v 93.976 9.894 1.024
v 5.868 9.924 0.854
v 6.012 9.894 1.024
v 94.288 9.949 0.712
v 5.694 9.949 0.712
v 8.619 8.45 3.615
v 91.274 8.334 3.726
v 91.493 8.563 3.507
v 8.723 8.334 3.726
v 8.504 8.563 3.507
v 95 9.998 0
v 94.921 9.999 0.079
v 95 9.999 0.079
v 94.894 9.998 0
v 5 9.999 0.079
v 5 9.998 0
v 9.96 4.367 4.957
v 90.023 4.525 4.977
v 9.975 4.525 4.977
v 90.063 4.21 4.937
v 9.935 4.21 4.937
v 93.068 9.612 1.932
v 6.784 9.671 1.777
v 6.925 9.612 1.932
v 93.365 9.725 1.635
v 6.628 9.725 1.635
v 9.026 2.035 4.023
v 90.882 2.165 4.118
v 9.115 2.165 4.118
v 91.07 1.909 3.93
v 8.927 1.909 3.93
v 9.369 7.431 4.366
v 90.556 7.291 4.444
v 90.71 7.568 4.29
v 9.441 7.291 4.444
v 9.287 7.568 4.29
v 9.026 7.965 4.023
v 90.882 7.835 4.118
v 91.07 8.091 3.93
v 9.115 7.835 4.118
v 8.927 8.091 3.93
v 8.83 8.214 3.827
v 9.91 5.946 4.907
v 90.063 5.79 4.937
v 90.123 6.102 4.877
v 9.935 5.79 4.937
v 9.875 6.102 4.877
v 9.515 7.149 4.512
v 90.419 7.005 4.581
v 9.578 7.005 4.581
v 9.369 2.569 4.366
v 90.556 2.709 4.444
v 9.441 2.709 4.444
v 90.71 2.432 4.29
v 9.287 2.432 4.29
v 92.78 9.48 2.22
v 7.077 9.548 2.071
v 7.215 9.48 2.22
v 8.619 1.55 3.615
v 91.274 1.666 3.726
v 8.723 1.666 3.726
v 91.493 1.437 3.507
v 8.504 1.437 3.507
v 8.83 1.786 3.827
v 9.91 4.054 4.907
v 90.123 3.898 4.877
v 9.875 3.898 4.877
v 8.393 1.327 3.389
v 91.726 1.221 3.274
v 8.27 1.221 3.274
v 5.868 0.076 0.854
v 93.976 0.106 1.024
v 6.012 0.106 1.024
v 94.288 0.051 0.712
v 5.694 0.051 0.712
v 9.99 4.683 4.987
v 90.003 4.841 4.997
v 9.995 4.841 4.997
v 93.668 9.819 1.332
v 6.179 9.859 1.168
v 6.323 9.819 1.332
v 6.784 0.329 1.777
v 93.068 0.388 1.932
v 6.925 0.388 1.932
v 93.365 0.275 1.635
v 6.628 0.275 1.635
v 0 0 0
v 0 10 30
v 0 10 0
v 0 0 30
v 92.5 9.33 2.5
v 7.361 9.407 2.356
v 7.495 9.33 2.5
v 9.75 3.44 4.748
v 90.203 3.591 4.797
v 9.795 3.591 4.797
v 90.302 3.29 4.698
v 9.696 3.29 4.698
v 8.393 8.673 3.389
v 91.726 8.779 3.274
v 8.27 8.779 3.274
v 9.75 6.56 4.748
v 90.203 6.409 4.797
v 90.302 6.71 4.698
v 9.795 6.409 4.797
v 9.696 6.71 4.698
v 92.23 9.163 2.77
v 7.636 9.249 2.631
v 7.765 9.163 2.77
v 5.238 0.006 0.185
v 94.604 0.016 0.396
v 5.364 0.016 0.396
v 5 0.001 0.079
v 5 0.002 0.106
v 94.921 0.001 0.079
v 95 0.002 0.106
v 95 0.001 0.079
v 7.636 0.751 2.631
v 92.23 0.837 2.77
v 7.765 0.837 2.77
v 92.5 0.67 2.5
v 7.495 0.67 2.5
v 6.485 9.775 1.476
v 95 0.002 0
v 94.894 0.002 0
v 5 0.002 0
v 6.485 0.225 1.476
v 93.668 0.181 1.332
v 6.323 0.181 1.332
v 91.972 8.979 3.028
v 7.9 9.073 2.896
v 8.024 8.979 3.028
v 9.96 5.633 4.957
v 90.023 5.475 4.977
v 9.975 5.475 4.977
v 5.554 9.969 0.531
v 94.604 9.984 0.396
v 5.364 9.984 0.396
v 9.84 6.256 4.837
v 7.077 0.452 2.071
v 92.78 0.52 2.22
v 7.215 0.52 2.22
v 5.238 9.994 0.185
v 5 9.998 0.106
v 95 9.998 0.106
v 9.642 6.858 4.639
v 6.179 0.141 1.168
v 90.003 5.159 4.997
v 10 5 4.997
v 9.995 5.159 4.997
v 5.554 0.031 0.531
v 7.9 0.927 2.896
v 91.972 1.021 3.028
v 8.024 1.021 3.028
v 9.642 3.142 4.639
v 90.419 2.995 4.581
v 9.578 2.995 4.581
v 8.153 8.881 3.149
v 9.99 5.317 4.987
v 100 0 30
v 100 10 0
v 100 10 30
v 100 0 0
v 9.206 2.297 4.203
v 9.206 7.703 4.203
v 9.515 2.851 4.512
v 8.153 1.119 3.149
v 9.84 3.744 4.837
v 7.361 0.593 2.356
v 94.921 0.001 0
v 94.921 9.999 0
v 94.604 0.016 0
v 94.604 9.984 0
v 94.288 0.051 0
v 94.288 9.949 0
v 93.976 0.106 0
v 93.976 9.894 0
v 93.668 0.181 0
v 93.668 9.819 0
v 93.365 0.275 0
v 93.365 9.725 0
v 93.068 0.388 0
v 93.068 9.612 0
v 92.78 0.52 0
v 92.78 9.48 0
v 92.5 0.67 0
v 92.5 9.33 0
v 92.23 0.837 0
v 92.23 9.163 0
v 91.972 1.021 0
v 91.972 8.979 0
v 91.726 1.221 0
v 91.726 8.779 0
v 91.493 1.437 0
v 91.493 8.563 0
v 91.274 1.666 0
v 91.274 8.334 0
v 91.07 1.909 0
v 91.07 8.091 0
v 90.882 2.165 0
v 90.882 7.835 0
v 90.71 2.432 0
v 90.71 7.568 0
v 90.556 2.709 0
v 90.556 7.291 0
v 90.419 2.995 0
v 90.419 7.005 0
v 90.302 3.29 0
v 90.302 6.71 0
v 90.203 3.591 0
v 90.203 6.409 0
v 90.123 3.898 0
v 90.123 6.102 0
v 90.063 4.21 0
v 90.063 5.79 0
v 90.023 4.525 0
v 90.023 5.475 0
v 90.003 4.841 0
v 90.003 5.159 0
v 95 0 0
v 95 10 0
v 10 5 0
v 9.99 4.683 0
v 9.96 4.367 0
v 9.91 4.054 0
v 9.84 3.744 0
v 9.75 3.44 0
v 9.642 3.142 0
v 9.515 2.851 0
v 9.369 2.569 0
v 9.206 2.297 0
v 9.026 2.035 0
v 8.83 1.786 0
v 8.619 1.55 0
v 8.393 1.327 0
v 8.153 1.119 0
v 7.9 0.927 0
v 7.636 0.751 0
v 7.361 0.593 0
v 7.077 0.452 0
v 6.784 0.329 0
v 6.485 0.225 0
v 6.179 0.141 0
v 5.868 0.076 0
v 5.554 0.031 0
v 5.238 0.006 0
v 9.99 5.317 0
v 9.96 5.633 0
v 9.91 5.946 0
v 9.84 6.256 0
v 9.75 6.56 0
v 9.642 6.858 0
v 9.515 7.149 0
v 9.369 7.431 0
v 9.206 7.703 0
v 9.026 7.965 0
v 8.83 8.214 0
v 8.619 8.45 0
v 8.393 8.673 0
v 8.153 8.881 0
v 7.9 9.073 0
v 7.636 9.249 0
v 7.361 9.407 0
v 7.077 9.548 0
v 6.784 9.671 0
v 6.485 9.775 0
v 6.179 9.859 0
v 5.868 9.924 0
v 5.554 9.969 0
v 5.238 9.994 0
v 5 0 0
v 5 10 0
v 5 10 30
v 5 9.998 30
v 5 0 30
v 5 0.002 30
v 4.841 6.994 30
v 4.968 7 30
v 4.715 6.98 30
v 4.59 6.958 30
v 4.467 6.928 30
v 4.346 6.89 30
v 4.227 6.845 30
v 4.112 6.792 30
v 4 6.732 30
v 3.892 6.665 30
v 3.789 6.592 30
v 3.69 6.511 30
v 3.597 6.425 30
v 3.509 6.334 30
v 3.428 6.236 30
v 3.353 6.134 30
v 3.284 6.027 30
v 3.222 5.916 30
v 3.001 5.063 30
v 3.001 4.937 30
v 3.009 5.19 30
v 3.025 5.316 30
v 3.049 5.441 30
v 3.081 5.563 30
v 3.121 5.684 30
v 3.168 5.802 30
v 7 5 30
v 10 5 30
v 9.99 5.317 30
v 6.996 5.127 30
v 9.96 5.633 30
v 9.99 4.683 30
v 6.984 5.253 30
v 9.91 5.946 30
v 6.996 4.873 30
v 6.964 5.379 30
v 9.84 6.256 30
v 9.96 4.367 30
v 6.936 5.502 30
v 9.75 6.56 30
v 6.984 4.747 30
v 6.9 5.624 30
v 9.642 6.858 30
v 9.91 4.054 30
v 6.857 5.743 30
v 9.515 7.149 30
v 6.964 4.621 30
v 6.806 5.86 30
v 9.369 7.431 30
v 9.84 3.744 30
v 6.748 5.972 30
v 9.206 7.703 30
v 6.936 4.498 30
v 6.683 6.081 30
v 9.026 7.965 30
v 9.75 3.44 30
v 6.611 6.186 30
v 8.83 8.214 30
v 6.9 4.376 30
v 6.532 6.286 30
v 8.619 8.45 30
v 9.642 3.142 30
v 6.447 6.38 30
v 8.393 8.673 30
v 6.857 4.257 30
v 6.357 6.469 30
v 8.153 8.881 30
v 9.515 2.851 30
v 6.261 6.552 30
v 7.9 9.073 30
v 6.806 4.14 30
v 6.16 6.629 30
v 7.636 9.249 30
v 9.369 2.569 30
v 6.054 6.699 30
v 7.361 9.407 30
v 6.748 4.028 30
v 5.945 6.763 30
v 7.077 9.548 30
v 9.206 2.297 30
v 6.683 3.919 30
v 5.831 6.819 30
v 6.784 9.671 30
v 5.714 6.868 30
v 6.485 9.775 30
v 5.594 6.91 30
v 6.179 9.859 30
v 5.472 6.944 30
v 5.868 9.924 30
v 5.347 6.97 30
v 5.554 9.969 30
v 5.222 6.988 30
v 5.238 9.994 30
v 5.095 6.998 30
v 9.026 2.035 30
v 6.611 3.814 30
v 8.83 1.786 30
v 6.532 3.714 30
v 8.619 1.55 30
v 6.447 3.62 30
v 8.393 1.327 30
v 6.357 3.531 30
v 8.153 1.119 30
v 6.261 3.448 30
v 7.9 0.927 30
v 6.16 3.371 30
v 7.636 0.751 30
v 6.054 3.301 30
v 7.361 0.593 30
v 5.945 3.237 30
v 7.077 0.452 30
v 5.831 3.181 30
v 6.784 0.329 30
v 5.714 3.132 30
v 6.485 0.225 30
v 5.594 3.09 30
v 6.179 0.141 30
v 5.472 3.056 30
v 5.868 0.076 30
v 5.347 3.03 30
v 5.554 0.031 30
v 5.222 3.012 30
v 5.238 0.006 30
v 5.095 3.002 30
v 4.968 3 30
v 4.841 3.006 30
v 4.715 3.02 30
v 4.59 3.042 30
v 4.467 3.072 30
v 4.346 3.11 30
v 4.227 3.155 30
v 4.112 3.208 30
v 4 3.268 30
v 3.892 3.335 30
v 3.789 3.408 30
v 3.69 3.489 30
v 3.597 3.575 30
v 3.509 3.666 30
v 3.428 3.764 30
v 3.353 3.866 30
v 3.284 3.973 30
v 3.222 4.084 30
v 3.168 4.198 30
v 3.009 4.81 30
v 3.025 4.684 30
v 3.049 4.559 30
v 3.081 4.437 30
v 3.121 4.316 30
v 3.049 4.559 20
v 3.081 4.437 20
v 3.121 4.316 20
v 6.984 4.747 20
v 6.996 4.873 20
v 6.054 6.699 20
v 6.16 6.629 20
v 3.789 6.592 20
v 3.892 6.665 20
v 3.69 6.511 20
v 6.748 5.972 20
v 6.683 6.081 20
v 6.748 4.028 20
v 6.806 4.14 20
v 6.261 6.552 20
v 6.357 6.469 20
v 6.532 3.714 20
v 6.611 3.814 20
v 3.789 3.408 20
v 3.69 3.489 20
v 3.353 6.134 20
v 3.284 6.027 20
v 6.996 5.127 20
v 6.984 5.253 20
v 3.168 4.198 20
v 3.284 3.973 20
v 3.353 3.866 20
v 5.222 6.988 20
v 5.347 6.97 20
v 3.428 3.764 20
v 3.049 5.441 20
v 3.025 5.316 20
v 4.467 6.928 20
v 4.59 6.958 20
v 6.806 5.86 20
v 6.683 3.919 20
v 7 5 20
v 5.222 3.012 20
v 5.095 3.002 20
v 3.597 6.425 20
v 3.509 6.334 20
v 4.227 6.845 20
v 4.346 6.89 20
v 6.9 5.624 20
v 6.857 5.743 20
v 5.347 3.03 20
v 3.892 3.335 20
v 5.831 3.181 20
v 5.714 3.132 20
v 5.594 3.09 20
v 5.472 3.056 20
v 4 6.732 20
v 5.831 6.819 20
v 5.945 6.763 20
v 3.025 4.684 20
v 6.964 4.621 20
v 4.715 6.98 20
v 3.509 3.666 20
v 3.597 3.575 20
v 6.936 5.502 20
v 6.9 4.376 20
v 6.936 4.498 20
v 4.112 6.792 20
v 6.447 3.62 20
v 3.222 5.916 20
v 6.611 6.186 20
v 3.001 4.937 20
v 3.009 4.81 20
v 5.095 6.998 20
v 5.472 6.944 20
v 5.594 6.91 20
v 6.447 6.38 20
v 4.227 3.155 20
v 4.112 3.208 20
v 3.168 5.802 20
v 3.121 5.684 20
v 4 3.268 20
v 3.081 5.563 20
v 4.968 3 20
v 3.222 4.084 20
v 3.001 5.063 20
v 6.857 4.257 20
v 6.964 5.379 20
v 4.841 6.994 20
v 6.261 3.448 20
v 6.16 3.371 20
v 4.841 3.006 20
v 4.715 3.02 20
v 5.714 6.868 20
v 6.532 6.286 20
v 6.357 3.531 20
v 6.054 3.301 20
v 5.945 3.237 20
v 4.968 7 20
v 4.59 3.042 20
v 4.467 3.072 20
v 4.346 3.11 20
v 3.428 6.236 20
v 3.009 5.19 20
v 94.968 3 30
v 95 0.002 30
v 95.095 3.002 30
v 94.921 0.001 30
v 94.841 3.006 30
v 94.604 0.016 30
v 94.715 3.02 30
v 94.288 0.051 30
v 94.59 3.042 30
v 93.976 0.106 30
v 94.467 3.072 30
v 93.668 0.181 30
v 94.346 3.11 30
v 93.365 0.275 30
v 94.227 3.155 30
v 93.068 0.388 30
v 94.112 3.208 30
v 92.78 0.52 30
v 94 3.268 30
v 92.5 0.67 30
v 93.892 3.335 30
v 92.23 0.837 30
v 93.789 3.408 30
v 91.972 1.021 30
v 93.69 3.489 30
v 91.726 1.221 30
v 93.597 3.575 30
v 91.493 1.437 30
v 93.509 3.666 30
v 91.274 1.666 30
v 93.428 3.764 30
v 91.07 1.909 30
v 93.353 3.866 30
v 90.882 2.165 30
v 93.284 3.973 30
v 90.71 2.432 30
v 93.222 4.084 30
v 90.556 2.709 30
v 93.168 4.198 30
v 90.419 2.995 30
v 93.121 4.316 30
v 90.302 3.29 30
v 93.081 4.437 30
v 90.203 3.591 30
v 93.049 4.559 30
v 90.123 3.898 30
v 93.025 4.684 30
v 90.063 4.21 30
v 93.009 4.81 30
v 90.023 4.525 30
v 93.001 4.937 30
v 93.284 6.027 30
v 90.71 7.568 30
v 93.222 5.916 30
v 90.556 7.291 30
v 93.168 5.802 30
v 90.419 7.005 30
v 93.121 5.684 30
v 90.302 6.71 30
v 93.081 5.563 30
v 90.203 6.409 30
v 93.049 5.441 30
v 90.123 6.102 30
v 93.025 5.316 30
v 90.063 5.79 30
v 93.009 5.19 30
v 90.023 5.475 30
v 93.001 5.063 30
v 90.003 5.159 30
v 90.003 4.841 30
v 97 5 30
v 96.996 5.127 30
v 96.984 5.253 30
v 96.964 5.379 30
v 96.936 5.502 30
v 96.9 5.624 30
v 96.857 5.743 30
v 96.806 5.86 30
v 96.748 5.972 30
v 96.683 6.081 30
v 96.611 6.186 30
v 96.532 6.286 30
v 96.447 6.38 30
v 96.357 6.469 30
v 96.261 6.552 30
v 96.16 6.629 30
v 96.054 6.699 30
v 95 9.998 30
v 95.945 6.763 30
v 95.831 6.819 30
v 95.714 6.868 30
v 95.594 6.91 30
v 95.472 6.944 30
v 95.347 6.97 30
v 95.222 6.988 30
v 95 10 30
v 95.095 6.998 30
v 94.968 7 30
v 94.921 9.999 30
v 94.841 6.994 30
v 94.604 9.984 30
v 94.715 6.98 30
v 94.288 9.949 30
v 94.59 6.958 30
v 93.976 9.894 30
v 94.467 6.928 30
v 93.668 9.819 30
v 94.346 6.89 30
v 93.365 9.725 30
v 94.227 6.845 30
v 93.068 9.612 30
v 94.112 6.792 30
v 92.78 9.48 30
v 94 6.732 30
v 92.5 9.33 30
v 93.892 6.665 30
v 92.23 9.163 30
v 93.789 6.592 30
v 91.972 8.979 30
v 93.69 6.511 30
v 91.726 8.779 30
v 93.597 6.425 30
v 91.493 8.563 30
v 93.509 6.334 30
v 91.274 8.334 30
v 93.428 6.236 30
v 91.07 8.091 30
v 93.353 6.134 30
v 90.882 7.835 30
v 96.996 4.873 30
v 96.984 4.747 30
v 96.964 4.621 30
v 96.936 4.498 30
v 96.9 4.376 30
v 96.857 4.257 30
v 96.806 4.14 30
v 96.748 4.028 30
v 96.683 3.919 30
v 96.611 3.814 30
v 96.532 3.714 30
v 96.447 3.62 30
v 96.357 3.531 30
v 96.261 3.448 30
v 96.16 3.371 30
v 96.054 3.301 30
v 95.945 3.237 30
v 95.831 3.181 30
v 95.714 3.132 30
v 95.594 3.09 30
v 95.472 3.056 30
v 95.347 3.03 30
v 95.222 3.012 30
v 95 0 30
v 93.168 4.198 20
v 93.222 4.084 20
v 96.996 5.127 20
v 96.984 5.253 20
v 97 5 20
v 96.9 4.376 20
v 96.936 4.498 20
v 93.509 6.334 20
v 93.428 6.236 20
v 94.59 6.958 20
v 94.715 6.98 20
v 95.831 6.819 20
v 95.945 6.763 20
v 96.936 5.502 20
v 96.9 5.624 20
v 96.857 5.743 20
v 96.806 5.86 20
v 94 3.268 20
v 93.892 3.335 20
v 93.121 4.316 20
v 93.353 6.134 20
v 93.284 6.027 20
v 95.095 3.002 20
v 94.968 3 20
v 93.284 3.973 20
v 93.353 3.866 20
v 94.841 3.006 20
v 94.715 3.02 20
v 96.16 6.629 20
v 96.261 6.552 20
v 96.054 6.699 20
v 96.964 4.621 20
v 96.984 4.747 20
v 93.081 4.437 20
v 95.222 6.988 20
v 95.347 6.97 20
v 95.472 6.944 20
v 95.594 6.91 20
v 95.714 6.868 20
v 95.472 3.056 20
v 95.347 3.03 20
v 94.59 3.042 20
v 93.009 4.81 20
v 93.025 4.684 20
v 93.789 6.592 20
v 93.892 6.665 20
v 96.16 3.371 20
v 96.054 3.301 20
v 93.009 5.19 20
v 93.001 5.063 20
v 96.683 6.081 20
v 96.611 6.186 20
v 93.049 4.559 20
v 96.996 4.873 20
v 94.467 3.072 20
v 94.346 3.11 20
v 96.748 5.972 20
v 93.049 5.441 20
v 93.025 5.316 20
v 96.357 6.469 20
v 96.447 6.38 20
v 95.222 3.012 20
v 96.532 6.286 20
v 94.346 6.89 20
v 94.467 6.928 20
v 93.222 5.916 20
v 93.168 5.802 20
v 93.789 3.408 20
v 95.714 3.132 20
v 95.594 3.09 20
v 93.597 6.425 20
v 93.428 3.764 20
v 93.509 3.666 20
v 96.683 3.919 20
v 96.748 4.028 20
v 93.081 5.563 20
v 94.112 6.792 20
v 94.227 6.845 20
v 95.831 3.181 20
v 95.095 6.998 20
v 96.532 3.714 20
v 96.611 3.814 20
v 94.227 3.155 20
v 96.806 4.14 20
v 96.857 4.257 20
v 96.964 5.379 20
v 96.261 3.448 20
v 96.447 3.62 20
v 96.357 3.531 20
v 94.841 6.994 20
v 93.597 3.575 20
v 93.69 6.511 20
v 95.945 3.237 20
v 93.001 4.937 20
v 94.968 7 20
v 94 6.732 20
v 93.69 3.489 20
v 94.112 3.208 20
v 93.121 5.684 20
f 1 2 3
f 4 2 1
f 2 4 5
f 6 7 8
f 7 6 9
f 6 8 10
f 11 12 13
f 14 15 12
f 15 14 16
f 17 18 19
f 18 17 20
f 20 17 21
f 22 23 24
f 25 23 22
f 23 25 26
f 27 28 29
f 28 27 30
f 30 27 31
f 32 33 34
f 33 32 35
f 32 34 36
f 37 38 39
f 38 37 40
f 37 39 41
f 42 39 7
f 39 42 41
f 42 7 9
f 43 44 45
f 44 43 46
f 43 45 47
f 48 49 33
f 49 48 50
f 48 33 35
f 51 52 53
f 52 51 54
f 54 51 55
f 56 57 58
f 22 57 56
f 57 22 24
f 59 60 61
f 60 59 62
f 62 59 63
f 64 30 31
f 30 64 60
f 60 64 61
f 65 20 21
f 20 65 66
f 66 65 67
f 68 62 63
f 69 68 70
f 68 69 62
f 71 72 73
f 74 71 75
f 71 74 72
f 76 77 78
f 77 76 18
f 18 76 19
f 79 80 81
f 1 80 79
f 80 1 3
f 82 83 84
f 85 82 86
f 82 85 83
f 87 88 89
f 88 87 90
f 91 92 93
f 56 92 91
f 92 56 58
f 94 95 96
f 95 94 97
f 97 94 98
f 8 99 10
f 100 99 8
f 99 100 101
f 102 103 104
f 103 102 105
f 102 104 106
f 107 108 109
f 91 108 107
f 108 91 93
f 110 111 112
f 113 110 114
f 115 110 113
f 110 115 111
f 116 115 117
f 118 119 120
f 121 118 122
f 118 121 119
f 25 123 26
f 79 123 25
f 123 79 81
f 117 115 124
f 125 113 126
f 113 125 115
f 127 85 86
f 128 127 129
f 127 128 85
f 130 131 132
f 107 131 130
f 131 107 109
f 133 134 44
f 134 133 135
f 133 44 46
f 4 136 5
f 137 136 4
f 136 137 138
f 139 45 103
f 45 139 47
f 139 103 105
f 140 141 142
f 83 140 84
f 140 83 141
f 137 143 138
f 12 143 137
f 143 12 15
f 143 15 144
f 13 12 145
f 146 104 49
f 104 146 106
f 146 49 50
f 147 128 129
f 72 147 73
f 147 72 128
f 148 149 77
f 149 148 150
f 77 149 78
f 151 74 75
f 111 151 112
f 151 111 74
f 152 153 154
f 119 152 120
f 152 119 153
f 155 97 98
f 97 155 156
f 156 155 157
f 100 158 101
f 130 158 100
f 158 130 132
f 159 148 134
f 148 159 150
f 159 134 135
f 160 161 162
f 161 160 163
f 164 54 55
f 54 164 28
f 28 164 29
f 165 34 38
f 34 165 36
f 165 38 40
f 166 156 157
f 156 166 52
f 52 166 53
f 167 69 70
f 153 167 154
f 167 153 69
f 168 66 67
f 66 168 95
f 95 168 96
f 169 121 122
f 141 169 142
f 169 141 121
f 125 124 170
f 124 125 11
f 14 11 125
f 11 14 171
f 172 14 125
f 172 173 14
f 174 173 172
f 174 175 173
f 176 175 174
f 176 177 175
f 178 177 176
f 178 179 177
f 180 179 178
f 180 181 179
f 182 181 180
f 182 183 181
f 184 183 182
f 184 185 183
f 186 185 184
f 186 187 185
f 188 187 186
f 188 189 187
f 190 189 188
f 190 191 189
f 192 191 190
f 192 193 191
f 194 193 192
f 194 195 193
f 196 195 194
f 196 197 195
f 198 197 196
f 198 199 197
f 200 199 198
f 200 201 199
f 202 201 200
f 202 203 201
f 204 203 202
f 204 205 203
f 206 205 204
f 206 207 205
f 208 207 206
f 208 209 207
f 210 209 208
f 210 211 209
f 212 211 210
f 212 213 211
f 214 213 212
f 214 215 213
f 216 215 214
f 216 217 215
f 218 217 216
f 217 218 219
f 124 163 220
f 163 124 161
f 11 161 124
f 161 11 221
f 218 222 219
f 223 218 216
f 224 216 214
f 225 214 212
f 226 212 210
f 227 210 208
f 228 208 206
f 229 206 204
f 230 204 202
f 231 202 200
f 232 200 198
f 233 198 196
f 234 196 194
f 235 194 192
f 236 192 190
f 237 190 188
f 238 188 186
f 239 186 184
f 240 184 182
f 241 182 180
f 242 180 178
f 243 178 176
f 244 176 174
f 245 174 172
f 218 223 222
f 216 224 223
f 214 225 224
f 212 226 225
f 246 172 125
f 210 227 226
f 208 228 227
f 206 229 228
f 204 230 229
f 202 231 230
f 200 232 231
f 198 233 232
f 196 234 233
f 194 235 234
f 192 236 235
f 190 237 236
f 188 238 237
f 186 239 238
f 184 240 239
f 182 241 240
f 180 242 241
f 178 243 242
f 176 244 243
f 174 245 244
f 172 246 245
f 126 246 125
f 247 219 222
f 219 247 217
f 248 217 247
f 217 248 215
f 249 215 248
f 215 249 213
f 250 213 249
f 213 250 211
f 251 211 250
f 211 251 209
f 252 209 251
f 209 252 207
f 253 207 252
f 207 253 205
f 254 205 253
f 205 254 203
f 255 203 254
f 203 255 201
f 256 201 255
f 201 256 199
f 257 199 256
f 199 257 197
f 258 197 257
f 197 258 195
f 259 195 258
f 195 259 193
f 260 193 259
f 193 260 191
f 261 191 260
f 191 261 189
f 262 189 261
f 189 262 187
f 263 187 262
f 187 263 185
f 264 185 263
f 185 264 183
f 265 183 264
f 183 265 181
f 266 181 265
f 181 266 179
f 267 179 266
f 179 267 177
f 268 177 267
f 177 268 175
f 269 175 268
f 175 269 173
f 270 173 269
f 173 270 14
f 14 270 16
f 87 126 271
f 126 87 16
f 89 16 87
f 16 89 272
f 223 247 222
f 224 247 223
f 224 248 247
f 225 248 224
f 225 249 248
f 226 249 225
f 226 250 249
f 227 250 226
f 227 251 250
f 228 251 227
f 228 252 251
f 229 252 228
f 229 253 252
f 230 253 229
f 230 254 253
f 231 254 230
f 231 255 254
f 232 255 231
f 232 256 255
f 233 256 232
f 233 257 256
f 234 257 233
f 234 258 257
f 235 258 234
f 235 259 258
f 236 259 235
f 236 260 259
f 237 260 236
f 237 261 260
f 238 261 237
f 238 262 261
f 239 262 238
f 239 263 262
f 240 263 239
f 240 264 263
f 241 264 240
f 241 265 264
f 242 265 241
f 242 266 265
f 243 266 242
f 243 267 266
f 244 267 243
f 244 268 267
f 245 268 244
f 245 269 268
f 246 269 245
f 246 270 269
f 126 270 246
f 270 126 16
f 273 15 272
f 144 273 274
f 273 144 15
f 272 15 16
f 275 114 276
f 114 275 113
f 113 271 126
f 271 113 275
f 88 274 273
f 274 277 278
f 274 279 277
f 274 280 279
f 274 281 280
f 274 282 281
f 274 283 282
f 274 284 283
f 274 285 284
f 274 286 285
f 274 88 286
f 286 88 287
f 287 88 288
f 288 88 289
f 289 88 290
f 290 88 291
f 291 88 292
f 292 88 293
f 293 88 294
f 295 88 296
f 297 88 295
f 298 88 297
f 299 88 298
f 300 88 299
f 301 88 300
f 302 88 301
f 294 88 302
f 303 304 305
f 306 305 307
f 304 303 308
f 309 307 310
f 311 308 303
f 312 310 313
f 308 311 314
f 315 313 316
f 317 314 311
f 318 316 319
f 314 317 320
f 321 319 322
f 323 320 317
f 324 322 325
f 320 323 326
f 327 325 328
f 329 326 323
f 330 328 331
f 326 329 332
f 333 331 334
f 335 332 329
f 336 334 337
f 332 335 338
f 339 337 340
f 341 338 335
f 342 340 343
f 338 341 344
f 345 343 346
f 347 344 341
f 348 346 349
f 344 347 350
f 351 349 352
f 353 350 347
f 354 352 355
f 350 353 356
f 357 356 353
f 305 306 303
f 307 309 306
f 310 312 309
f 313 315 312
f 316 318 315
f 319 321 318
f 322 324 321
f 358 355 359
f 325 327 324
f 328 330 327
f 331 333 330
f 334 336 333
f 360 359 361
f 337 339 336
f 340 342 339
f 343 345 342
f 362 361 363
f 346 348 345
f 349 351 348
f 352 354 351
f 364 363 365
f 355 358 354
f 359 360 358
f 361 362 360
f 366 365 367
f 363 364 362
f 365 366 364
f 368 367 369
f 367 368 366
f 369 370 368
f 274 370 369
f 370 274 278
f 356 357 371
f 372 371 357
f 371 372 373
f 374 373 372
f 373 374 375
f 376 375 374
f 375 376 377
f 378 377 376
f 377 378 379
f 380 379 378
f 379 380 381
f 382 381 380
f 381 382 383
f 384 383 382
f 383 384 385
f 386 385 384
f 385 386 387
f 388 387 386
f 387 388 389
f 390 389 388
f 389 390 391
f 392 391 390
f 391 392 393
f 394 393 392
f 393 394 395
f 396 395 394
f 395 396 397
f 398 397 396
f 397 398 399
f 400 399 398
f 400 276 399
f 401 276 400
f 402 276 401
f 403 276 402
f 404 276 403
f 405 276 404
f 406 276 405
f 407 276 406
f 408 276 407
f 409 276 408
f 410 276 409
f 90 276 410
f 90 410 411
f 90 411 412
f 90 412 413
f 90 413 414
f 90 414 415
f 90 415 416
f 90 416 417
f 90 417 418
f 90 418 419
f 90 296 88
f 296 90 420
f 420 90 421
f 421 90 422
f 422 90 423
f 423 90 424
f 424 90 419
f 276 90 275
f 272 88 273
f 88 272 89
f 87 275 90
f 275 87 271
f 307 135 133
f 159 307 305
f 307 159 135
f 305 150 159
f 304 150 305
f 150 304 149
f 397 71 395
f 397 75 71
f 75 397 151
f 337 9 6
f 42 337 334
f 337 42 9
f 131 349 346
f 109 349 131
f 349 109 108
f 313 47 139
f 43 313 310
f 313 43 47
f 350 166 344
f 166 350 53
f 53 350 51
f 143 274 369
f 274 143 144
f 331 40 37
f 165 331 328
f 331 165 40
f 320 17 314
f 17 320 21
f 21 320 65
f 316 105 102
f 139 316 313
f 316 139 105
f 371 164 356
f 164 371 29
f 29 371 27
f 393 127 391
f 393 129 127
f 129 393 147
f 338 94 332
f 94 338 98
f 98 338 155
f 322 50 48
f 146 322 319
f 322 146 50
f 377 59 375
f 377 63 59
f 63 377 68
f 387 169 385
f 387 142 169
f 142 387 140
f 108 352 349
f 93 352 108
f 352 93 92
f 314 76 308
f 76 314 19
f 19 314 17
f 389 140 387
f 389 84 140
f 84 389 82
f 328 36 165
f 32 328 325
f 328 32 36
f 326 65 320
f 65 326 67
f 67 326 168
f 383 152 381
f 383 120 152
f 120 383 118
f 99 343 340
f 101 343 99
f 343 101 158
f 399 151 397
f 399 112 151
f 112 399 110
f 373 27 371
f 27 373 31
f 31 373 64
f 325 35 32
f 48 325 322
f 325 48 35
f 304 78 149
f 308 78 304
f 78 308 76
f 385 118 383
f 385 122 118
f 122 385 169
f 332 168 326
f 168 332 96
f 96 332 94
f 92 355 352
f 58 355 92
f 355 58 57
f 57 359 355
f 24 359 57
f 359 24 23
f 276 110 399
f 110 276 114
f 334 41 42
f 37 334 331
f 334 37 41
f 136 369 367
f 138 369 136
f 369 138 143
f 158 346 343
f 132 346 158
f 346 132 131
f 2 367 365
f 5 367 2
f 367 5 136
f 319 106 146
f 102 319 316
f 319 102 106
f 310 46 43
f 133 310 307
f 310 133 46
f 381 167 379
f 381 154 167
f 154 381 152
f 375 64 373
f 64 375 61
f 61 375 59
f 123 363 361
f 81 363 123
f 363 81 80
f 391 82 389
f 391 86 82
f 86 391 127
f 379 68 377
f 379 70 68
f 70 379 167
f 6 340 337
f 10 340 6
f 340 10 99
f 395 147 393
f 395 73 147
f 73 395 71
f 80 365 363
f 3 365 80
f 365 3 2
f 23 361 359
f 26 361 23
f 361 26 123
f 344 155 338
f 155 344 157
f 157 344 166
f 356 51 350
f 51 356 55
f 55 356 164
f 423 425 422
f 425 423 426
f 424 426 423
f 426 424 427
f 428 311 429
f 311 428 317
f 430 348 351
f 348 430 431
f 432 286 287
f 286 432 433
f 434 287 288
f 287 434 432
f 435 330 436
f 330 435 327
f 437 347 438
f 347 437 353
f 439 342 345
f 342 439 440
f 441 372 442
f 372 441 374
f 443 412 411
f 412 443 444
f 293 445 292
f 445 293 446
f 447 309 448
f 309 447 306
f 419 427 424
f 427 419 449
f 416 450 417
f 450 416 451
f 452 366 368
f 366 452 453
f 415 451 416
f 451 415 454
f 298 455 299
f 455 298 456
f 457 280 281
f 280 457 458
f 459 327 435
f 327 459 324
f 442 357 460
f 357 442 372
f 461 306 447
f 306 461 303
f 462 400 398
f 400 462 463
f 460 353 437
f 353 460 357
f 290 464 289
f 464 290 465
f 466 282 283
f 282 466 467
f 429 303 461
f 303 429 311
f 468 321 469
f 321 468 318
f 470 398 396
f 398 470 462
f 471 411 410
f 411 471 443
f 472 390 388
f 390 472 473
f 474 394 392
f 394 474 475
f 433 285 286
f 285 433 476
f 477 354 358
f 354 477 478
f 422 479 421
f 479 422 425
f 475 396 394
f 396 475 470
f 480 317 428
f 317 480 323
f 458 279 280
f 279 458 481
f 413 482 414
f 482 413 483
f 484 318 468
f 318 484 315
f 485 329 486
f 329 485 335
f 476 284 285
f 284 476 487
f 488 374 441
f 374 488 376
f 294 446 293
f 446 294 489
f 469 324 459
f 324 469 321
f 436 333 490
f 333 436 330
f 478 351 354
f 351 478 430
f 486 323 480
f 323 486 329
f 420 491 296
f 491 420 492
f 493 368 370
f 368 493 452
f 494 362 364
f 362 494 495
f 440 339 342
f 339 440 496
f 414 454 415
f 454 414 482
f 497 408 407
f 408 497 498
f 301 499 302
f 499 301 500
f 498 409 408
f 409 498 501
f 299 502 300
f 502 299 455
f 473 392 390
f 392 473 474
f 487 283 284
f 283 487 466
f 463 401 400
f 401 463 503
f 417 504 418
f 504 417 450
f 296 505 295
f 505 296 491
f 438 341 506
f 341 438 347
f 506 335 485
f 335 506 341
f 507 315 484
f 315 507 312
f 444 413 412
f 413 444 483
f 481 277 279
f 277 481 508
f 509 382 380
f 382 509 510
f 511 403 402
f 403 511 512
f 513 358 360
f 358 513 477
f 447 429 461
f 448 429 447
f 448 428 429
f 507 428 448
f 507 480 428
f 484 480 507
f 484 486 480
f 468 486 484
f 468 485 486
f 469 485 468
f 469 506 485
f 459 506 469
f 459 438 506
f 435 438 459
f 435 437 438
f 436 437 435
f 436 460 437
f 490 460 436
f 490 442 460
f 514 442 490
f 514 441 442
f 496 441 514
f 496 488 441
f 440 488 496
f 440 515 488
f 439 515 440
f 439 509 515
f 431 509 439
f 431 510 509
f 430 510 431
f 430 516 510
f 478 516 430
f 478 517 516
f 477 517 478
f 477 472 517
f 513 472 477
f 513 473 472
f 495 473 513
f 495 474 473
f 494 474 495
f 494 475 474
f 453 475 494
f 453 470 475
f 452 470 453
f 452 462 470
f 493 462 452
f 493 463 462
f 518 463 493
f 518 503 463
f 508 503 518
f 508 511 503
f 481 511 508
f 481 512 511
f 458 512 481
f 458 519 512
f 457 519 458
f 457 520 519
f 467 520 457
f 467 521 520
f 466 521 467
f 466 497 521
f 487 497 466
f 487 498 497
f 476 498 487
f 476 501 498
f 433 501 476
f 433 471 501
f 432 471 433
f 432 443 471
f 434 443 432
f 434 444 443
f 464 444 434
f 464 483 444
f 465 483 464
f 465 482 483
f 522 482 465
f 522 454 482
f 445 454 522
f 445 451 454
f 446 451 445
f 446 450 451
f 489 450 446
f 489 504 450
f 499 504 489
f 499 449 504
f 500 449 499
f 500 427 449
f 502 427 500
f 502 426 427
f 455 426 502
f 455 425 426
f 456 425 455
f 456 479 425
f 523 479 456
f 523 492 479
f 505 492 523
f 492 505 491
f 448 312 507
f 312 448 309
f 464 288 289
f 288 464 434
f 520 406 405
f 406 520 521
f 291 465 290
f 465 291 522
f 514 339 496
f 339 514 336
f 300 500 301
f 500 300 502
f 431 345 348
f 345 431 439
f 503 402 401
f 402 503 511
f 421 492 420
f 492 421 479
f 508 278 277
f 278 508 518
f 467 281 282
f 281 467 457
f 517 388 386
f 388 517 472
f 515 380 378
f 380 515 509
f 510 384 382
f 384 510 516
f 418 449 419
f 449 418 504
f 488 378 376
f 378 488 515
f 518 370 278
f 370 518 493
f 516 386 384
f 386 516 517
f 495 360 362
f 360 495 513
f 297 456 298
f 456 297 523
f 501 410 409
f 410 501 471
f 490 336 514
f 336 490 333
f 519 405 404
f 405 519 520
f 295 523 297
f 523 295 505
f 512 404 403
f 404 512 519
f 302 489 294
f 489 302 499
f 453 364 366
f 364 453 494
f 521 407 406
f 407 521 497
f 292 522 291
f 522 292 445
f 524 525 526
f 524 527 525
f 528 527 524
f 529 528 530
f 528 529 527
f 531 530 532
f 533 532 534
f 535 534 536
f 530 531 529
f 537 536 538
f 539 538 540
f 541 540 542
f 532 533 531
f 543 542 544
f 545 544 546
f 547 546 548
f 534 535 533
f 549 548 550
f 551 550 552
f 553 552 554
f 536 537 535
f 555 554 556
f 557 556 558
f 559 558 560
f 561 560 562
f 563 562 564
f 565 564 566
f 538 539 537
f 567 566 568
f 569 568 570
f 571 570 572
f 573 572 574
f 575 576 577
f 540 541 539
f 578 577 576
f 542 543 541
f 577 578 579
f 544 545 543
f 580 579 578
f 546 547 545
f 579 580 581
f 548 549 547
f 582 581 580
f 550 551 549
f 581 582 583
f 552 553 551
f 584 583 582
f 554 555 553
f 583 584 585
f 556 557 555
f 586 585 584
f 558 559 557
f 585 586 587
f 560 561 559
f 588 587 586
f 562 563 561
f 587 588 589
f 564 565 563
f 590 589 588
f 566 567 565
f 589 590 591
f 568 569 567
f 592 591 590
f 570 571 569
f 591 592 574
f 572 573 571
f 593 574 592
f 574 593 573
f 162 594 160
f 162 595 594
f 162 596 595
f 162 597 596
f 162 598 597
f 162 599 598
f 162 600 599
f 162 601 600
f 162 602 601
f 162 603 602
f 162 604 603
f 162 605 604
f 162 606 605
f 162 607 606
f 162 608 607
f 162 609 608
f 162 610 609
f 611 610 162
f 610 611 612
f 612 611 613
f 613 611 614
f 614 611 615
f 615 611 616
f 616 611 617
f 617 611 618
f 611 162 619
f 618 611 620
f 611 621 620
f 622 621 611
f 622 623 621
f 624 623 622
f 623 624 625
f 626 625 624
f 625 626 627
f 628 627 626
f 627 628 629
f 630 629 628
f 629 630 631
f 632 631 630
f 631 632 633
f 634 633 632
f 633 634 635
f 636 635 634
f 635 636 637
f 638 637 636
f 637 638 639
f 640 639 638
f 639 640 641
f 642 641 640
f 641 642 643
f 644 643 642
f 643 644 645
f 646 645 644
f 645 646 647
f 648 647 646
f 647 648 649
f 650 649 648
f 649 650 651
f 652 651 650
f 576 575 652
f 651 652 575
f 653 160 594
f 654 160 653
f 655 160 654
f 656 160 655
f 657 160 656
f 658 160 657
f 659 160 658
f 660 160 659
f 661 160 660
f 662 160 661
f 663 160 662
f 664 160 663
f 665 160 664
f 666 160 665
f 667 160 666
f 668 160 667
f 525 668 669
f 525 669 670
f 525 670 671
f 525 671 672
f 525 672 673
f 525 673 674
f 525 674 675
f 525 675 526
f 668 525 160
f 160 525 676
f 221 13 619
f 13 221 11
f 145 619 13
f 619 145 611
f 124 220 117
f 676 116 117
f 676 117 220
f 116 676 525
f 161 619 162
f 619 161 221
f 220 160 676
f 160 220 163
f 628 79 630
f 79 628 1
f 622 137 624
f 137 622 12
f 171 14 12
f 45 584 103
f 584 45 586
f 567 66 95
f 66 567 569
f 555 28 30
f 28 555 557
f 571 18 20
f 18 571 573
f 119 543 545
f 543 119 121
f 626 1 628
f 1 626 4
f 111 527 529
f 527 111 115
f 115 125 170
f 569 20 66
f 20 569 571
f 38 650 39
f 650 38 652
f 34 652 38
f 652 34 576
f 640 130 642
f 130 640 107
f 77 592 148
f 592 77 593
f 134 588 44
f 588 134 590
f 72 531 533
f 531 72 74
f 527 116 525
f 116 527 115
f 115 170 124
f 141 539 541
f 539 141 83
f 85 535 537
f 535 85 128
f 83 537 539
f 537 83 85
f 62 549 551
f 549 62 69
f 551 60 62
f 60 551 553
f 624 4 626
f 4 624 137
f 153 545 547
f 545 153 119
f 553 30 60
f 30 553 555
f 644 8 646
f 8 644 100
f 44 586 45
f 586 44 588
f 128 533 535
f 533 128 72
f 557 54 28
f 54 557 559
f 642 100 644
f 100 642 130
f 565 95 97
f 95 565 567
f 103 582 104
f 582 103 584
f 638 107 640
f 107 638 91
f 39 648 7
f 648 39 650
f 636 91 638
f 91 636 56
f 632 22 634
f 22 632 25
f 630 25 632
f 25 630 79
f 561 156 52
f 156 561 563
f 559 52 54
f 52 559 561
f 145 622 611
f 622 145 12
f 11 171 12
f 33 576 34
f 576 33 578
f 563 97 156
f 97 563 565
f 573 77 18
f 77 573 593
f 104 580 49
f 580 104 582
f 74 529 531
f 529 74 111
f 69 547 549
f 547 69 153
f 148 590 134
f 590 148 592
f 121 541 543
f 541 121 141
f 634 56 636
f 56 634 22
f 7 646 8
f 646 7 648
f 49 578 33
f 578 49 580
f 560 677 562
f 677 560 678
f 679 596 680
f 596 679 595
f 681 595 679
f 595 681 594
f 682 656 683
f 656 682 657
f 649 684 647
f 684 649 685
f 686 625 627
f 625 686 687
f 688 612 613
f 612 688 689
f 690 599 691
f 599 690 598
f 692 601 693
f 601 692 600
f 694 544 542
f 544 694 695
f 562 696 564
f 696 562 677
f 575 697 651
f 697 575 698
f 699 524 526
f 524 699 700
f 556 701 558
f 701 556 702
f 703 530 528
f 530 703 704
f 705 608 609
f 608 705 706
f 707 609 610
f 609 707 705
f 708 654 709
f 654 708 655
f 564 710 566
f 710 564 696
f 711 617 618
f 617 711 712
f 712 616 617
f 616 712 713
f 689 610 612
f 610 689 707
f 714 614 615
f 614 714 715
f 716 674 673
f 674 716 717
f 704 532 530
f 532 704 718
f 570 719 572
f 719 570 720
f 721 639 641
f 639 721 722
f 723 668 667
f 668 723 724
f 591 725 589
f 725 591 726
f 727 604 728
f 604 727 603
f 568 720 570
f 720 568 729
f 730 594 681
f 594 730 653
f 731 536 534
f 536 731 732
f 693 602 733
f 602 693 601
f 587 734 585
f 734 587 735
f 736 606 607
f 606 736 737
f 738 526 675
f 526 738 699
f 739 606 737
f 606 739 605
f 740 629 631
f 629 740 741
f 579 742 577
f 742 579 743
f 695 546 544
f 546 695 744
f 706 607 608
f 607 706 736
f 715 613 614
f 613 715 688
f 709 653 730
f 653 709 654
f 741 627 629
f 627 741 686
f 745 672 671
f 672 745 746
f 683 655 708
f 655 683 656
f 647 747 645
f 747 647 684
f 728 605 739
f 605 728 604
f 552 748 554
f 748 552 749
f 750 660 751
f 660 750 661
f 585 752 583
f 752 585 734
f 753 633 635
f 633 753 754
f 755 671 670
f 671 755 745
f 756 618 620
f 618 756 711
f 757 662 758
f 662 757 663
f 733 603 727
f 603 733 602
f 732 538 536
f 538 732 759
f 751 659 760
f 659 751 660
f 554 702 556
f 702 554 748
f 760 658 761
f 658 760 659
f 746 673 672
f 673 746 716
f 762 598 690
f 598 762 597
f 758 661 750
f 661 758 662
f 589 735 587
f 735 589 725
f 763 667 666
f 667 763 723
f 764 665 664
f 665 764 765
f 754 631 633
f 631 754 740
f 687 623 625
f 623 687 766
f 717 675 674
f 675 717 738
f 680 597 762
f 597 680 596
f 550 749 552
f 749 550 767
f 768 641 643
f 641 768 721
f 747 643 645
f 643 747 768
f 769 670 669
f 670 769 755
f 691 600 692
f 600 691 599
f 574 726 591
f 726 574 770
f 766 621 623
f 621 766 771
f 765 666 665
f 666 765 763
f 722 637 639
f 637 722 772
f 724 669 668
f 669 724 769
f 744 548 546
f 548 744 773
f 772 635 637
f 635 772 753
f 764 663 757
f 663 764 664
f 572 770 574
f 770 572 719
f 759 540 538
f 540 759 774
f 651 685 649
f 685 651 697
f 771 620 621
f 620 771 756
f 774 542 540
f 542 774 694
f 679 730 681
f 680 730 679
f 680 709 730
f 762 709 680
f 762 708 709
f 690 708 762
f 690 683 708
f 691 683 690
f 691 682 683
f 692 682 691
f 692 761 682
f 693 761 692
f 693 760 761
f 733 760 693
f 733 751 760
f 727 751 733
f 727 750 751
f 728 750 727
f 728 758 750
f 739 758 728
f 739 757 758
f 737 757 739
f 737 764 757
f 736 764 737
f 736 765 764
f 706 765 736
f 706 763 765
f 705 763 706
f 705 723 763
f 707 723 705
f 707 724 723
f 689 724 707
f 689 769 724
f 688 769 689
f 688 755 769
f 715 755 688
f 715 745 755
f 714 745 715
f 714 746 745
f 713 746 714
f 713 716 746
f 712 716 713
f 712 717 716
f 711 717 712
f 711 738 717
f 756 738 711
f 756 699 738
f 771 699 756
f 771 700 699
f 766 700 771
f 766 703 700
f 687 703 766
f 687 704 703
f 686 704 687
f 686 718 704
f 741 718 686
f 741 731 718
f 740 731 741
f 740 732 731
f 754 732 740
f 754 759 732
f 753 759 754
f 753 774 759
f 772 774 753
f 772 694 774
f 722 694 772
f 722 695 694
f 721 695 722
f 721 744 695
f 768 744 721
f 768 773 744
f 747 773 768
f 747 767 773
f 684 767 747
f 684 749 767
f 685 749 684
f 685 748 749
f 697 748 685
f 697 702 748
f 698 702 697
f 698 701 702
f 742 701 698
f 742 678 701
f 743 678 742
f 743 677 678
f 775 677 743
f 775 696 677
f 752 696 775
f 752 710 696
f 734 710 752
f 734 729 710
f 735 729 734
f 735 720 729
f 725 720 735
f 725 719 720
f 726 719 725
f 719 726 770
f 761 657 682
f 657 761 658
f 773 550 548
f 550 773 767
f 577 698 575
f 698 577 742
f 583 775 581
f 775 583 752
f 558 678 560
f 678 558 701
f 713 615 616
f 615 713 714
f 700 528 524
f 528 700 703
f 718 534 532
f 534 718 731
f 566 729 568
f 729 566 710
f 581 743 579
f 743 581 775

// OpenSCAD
$fn = 99;

SUPPORT_HEIGHT=30;
HANDLE_LENGTH=100;

module handle(){
    difference(){
        translate([0,5,0]){
            rotate(a=90, v=[0,1,0]){
                cylinder(h=HANDLE_LENGTH, r=5);  
            }
        }

        translate([0,0,-5]){
            cube([HANDLE_LENGTH,10,5]);
        }
    }
}

module support(flipped){
    difference(){
        if (flipped){
            cube([5,10,SUPPORT_HEIGHT]);

            translate([5,5,0]){
                cylinder(h=SUPPORT_HEIGHT,r=5);
            }
        } else {
            cube([5,10,SUPPORT_HEIGHT]);

            translate([0,5,0]){
                cylinder(h=SUPPORT_HEIGHT,r=5);
            }
        }
        
        translate([flipped ? 5 : 0,5,SUPPORT_HEIGHT-10]){
                cylinder(h=10, r=2);
        }
    }
}

handle();
support(true);
translate([HANDLE_LENGTH-5,0,0]){
    support();
}
